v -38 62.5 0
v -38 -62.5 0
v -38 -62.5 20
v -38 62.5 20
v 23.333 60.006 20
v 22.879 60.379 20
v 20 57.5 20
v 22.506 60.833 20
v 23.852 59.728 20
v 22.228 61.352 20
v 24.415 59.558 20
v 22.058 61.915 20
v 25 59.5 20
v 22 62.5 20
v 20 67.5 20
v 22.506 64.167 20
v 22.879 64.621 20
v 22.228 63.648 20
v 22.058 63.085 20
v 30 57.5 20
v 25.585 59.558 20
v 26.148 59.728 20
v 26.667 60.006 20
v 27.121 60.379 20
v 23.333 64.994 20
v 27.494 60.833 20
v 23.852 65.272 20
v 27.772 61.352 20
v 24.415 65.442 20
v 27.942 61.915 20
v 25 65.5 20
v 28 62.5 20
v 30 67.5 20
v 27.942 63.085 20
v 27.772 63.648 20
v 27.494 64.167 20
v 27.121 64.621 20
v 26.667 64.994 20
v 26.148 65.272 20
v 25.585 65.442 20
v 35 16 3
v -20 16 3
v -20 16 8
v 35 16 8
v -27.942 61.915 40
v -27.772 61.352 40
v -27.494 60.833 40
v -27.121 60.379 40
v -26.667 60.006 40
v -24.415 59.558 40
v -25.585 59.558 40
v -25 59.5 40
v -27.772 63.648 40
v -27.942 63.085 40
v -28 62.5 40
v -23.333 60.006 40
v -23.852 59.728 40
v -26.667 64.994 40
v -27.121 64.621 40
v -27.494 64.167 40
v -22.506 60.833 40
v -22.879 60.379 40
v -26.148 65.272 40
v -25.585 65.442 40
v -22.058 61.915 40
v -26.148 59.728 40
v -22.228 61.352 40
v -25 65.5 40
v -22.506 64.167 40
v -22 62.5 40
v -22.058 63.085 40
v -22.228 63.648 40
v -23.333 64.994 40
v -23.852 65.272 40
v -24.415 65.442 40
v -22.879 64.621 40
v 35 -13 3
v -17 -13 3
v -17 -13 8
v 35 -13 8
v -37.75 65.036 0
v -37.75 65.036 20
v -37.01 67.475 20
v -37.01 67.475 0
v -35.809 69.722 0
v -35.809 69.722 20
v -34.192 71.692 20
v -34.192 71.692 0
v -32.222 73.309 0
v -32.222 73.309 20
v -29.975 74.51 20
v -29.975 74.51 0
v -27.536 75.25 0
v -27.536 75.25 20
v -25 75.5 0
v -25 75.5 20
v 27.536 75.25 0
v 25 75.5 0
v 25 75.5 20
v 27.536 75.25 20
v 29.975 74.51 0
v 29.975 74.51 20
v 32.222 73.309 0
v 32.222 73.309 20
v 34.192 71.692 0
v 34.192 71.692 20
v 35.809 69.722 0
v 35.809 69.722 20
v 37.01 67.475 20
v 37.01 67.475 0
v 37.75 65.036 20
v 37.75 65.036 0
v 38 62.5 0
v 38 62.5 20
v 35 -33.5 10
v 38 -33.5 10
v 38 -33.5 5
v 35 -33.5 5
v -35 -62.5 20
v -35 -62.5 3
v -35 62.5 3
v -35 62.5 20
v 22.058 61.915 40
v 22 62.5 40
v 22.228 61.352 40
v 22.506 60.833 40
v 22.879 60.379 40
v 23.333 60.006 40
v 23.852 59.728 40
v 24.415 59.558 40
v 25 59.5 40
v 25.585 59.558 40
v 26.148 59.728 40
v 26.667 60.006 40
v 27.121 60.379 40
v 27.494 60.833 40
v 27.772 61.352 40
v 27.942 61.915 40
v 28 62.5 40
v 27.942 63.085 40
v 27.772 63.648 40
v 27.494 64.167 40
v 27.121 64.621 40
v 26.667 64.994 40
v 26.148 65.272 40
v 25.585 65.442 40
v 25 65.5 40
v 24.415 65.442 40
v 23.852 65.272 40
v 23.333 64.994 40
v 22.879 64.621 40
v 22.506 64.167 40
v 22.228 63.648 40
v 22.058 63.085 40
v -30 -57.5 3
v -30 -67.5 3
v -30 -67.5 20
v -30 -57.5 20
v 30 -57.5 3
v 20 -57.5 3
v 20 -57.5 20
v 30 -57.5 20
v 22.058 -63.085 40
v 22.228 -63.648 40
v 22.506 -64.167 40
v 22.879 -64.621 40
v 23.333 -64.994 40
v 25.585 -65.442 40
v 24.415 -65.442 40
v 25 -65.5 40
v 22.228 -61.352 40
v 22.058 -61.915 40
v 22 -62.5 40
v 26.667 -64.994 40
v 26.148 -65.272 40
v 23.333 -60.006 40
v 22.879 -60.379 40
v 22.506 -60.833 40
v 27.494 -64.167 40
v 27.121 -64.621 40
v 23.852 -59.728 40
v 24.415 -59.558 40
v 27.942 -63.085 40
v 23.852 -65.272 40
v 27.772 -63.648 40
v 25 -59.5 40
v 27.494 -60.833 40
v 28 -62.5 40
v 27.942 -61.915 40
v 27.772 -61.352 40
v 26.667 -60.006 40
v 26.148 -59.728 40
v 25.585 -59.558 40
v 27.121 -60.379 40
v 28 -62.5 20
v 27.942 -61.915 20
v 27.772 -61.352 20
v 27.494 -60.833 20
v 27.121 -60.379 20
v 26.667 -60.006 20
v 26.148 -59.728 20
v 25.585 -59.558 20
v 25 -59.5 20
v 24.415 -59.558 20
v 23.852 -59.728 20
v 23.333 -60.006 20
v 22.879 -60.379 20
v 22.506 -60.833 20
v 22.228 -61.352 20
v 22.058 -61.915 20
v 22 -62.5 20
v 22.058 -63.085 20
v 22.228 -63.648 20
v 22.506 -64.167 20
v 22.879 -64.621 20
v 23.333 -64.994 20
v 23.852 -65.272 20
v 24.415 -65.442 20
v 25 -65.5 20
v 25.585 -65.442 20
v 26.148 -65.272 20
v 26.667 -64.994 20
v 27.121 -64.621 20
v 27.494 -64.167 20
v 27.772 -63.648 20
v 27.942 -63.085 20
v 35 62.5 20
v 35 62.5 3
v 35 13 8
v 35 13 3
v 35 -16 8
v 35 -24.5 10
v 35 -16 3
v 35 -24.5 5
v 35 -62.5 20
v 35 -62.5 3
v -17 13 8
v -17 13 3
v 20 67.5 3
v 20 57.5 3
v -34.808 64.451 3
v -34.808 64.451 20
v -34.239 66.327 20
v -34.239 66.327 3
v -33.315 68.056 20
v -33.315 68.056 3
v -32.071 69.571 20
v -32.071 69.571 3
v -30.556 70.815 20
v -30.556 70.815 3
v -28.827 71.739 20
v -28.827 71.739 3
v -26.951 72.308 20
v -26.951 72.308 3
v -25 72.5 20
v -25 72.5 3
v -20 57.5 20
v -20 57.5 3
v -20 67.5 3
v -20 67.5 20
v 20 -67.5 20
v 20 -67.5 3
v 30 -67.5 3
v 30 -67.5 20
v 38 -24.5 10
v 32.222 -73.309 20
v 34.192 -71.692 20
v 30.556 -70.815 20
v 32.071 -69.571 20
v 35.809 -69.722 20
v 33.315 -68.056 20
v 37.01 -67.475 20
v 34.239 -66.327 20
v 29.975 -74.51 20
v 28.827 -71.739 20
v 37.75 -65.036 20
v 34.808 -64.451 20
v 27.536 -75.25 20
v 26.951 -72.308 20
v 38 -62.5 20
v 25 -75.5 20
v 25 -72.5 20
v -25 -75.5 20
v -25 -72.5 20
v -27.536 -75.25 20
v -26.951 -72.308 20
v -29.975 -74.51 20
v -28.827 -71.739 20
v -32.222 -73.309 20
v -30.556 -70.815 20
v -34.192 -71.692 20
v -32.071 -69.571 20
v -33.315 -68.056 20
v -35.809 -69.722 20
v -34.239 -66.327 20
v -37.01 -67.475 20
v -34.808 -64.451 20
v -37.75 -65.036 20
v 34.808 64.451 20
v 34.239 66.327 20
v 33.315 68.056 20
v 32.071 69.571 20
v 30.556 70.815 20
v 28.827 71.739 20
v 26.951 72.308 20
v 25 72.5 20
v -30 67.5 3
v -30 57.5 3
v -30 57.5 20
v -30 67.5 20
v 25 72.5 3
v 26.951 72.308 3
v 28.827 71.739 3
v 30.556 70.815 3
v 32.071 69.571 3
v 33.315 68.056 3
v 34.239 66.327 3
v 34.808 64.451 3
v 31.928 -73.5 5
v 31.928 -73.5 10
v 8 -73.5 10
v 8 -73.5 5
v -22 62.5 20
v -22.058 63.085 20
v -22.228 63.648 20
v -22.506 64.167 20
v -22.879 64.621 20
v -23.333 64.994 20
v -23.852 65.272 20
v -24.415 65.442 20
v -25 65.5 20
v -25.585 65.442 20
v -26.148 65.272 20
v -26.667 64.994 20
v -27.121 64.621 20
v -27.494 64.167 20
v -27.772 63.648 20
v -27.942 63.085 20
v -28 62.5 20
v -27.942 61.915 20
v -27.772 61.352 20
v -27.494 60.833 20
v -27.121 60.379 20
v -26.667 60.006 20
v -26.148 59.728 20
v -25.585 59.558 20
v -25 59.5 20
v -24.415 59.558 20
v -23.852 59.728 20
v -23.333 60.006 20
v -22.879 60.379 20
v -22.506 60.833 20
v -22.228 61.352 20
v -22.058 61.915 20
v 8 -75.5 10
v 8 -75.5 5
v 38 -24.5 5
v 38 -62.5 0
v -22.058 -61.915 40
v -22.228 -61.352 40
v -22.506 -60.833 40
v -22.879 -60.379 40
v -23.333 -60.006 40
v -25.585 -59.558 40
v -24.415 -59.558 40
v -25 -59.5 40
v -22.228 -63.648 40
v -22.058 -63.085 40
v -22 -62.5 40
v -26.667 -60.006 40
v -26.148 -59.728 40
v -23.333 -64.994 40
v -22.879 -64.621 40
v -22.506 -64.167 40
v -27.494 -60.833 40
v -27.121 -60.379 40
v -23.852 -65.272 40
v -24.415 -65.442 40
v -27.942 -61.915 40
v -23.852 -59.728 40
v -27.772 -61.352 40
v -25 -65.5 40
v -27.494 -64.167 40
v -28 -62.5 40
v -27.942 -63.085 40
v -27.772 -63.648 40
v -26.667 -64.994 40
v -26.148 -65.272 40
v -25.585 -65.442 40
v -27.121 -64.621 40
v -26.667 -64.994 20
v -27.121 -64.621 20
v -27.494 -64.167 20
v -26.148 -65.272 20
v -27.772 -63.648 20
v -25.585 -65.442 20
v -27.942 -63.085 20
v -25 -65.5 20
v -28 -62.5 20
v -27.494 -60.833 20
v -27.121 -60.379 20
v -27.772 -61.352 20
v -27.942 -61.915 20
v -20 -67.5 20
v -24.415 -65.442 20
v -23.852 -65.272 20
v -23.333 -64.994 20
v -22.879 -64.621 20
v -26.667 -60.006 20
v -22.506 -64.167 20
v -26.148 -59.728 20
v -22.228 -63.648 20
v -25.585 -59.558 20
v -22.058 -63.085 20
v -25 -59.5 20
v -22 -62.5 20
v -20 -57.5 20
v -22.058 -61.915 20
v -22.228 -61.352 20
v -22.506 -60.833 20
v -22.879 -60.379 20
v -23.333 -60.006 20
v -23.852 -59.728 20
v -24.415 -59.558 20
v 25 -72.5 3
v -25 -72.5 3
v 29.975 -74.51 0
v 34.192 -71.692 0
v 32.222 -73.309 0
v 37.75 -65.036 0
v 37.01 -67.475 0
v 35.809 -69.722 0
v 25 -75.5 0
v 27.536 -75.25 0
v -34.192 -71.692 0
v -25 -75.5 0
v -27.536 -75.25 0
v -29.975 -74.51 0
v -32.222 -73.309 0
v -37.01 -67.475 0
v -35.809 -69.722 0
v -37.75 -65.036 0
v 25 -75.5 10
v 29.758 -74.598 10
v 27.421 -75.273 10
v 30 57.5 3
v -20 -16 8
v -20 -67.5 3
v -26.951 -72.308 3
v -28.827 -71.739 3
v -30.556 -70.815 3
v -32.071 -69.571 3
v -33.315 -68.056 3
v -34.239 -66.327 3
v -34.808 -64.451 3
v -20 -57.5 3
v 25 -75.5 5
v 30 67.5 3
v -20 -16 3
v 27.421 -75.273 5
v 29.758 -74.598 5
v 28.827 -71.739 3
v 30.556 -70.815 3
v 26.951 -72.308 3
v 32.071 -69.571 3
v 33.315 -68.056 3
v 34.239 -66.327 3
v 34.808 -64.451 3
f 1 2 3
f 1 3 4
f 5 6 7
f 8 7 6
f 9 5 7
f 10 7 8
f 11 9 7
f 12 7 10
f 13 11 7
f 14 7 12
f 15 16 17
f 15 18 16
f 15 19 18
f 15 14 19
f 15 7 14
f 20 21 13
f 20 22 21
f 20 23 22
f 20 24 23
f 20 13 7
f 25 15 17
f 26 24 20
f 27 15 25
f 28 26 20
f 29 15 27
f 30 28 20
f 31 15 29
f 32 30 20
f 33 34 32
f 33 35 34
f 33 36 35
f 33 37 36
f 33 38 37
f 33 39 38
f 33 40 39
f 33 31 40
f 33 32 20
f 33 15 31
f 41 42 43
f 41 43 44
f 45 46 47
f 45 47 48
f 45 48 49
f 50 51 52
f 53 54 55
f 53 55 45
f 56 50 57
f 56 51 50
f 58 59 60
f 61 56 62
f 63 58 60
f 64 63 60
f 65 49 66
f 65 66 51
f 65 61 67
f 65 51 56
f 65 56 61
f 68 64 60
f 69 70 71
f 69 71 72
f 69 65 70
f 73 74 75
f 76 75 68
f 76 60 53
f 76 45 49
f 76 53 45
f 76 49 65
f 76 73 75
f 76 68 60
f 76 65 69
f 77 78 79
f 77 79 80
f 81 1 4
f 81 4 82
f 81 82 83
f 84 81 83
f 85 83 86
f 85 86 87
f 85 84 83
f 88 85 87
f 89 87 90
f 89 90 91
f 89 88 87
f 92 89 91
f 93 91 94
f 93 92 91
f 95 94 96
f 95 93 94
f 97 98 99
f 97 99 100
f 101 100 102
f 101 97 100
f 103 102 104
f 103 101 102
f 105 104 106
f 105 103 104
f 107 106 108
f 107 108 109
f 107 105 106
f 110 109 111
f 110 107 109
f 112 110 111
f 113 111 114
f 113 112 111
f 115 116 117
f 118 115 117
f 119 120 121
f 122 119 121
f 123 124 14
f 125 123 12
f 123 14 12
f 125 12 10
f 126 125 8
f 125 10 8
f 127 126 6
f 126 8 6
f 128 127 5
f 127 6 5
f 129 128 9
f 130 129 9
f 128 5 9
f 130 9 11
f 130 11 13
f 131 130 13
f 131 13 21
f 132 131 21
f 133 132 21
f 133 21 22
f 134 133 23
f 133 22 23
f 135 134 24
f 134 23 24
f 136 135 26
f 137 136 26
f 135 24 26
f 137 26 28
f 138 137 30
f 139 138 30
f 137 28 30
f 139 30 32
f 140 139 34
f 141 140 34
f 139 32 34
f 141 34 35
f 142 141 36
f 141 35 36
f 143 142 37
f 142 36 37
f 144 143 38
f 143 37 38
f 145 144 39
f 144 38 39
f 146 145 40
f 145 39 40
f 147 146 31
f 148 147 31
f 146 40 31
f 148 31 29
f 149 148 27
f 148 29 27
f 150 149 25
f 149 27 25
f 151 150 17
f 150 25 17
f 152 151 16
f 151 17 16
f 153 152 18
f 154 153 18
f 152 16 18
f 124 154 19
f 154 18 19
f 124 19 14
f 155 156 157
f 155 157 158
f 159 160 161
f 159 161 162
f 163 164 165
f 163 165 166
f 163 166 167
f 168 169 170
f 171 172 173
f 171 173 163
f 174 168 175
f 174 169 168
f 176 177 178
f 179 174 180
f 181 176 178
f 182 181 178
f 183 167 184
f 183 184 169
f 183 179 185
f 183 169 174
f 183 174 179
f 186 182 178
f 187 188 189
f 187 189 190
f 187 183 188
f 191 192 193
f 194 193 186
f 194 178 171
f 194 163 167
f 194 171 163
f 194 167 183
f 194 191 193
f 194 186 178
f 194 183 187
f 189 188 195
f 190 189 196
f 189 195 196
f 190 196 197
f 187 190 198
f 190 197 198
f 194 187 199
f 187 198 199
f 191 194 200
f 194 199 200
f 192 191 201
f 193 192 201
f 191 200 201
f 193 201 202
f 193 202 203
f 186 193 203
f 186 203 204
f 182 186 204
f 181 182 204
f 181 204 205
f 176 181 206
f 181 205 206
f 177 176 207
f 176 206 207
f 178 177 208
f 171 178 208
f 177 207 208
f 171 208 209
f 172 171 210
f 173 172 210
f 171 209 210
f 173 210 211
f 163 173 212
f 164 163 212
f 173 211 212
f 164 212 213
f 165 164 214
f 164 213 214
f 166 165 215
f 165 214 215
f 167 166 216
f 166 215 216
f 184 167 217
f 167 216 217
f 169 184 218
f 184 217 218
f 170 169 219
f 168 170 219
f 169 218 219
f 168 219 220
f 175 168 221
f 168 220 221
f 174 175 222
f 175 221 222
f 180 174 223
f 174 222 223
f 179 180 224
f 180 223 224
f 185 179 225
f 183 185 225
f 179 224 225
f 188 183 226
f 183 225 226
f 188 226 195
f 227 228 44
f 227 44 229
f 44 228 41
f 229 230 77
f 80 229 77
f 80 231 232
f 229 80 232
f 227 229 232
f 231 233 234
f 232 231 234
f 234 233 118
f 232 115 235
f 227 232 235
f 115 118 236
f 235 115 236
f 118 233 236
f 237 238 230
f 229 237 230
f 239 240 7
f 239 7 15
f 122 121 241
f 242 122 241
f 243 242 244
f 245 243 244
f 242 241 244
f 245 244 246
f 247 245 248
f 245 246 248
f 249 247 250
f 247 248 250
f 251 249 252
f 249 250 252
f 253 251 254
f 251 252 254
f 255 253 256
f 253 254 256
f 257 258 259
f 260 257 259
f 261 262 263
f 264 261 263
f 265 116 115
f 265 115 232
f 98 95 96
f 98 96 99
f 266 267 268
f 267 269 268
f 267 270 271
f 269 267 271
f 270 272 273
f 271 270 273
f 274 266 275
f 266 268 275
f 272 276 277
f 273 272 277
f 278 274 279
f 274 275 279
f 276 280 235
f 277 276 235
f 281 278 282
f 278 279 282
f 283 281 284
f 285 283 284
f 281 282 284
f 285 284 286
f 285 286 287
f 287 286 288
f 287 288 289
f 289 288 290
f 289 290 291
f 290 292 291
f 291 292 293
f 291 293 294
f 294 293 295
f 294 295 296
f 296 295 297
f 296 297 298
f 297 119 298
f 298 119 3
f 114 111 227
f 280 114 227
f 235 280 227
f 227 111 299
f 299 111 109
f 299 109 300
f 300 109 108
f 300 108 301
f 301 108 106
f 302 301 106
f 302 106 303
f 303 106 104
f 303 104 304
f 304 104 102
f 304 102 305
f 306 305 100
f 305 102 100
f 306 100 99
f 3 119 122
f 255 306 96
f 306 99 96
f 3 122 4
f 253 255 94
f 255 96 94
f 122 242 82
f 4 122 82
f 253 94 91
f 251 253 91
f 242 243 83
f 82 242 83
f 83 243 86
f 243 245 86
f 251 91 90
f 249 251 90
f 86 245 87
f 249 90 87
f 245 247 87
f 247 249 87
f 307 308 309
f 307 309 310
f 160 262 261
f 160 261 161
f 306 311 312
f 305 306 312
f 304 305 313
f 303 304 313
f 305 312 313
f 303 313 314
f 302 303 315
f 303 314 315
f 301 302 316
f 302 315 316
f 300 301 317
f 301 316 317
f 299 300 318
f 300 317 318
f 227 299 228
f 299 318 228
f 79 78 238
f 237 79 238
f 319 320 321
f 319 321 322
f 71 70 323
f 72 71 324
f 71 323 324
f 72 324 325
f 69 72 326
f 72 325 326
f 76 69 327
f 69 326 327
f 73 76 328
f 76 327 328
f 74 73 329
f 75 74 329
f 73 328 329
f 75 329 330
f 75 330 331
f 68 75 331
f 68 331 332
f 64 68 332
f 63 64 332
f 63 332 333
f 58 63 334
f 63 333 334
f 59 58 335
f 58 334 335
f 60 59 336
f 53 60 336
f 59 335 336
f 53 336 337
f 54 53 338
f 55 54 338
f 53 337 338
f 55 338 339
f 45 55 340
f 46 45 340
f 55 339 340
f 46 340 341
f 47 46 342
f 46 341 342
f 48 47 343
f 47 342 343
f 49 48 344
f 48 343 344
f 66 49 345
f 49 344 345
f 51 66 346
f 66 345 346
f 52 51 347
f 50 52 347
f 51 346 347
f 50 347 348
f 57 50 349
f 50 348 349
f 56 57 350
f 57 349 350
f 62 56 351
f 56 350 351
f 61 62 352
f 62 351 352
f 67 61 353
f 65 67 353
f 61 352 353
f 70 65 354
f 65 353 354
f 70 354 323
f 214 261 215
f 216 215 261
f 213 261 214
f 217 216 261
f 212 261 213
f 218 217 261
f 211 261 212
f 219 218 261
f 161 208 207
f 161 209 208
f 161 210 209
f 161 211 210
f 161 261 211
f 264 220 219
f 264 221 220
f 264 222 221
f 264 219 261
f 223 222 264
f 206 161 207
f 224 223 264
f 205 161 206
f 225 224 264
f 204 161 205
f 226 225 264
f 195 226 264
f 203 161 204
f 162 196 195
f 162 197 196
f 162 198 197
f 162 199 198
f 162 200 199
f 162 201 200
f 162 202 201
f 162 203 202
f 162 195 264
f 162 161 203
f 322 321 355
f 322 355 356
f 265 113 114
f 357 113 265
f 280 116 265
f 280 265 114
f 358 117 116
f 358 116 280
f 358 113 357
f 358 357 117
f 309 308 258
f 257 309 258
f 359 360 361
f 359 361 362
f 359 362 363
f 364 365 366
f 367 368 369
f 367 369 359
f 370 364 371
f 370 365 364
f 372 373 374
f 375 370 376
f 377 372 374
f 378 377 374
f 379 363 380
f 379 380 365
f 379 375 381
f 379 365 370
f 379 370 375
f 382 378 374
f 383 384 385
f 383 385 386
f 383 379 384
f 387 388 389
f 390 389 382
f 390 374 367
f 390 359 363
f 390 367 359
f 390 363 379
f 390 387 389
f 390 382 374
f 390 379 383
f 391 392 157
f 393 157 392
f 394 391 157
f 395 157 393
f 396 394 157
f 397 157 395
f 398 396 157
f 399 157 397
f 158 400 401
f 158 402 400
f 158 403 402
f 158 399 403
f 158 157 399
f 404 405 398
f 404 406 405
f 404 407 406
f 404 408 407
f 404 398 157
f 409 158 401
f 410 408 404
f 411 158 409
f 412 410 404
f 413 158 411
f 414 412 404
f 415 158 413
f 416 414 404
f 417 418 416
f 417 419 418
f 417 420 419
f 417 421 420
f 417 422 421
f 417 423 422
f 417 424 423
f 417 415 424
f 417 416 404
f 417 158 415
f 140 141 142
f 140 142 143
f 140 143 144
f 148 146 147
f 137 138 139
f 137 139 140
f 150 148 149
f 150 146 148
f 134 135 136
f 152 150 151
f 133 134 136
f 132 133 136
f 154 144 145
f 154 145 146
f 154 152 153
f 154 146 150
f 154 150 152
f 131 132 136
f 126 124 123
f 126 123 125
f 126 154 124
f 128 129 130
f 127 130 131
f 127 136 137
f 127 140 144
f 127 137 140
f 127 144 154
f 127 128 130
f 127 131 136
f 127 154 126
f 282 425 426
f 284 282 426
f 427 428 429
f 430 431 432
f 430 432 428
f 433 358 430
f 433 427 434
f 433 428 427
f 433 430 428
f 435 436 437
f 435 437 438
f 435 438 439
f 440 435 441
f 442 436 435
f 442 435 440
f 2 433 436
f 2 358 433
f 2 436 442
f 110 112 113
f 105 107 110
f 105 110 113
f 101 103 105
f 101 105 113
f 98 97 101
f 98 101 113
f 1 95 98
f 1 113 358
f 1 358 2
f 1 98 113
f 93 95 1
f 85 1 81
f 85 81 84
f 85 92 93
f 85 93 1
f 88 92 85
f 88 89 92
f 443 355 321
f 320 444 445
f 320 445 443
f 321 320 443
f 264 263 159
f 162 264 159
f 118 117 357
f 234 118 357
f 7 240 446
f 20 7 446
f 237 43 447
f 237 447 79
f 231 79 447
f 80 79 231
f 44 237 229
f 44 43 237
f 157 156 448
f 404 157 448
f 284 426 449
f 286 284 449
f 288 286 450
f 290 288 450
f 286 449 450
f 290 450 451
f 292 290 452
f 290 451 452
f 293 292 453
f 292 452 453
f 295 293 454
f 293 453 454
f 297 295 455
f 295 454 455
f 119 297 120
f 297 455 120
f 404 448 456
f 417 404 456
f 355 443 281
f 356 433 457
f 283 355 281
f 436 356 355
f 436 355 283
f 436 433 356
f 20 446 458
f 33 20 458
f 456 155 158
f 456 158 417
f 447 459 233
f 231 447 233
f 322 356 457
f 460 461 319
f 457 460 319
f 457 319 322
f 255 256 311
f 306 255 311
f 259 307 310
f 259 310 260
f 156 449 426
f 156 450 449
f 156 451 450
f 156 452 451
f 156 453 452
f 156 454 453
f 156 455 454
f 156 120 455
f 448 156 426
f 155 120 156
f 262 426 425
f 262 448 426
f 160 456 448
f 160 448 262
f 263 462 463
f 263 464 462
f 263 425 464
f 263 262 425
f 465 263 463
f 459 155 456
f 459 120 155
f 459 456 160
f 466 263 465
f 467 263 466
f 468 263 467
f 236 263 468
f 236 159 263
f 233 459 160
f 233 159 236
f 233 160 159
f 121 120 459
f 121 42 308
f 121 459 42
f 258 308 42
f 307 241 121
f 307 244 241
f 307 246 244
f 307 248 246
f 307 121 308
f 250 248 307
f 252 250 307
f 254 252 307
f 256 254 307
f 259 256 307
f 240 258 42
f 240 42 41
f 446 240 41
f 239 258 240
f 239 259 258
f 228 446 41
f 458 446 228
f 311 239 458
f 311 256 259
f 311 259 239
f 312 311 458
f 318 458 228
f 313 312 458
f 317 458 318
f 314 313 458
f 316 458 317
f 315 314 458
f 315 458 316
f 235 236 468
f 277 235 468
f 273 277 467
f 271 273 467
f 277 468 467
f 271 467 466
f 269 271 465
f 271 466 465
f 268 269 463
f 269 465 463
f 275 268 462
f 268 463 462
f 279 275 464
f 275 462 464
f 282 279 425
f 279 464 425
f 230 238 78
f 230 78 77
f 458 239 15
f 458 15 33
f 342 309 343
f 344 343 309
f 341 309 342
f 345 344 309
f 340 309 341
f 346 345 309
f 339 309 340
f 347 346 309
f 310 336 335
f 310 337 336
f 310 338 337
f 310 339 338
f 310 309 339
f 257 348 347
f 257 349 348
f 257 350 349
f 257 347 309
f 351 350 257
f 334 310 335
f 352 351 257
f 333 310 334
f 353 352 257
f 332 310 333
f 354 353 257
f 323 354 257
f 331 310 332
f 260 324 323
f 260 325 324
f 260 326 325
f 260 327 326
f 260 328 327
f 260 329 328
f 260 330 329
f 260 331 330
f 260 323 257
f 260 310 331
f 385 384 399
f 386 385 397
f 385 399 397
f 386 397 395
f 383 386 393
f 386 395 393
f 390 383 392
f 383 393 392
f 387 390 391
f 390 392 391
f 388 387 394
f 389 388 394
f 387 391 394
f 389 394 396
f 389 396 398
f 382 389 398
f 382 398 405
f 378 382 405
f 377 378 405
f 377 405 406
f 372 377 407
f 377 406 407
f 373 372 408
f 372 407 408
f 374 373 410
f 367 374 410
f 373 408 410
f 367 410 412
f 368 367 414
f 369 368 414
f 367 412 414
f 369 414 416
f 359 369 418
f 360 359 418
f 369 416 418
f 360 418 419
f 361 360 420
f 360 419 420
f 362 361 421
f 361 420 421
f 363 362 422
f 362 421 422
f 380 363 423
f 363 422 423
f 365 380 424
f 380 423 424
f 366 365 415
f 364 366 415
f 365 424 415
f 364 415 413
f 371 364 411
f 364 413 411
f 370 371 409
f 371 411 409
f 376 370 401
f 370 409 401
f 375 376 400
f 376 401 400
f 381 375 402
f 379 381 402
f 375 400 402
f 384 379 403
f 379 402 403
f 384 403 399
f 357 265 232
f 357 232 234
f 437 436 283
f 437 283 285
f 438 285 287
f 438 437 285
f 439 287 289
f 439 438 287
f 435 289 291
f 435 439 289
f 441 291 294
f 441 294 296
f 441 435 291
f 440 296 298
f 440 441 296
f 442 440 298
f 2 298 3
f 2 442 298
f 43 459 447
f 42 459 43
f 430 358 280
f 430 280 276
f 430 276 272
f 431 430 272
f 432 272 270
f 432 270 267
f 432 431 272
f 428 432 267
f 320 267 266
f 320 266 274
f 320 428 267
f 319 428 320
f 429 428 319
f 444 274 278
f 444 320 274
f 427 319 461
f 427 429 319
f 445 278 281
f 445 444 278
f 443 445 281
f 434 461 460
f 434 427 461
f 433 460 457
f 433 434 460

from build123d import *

# Parameters (mm, degrees)
BOSS_EXTRUDE1_DEPTH = 20
BOSS_EXTRUDE2_DEPTH = 3
SKETCH4_W           = 10
SKETCH4_H           = 10
BOSS_EXTRUDE3_DEPTH = 17
SKETCH5_R           = 3
BOSS_EXTRUDE4_DEPTH = 20
SKETCH6_W           = 5
SKETCH6_H           = 9
CUT_EXTRUDE1_DEPTH  = 30
SKETCH7_W           = 58
SKETCH7_H           = 32
SKETCH7_W_2         = 52
SKETCH7_H_2         = 26
BOSS_EXTRUDE5_DEPTH = 5


with BuildPart() as part:
    # Sketch1 → Boss-Extrude1 (new body)
    with BuildSketch(Plane.XY):
        with BuildLine():
            Line((-25, 75.5), (25, 75.5))
            ThreePointArc((25, 75.5), (34.192388155, 71.692388155), (38, 62.5))
            Line((38, 62.5), (38, -62.5))
            ThreePointArc((38, -62.5), (34.192388155, -71.692388155), (25, -75.5))
            Line((25, -75.5), (-25, -75.5))
            ThreePointArc((-25, -75.5), (-34.192388155, -71.692388155), (-38, -62.5))
            Line((-38, -62.5), (-38, 62.5))
            ThreePointArc((-38, 62.5), (-34.192388155, 71.692388155), (-25, 75.5))
        make_face()
        with BuildLine():
            Line((-25, 72.5), (25, 72.5))
            ThreePointArc((25, 72.5), (32.071067812, 69.571067812), (35, 62.5))
            Line((35, 62.5), (35, -62.5))
            ThreePointArc((35, -62.5), (32.071067812, -69.571067812), (25, -72.5))
            Line((25, -72.5), (-25, -72.5))
            ThreePointArc((-25, -72.5), (-32.071067812, -69.571067812), (-35, -62.5))
            Line((-35, -62.5), (-35, 62.5))
            ThreePointArc((-35, 62.5), (-32.071067812, 69.571067812), (-25, 72.5))
        make_face(mode=Mode.SUBTRACT)
    extrude(amount=BOSS_EXTRUDE1_DEPTH)

    # Sketch3 → Boss-Extrude2 (add)
    with BuildSketch(Plane(origin=(0, 0, 0), x_dir=(-1, 0, 0), z_dir=(0, 0, -1))):
        with BuildLine():
            Line((25, -75.5), (-25, -75.5))
            ThreePointArc((-25, -75.5), (-34.192388155, -71.692388155), (-38, -62.5))
            Line((-38, -62.5), (-38, 62.5))
            ThreePointArc((-38, 62.5), (-34.192388155, 71.692388155), (-25, 75.5))
            Line((-25, 75.5), (25, 75.5))
            ThreePointArc((25, 75.5), (34.192388155, 71.692388155), (38, 62.5))
            Line((38, 62.5), (38, -62.5))
            ThreePointArc((38, -62.5), (34.192388155, -71.692388155), (25, -75.5))
        make_face()
    extrude(amount=-BOSS_EXTRUDE2_DEPTH)

    # Sketch4 → Boss-Extrude3 (add)
    with BuildSketch(Plane.XY.offset(3)):
        with Locations((-25, 62.5)):
            Rectangle(SKETCH4_W, SKETCH4_H)
        with Locations((25, 62.5)):
            Rectangle(SKETCH4_W, SKETCH4_H)
        with Locations((25, -62.5)):
            Rectangle(SKETCH4_W, SKETCH4_H)
        with Locations((-25, -62.5)):
            Rectangle(SKETCH4_W, SKETCH4_H)
    extrude(amount=BOSS_EXTRUDE3_DEPTH)

    # Sketch5 → Boss-Extrude4 (add)
    with BuildSketch(Plane.XY.offset(20)):
        with Locations((-25, 62.5)):
            Circle(SKETCH5_R)
        with Locations(Location((25, 62.5, 0), (0, 0, 180))):
            Circle(SKETCH5_R)
        with Locations((25, -62.5)):
            Circle(SKETCH5_R)
        with Locations(Location((-25, -62.5, 0), (0, 0, 180))):
            Circle(SKETCH5_R)
    extrude(amount=BOSS_EXTRUDE4_DEPTH)

    # Sketch6 → Cut-Extrude1 (cut)
    with BuildSketch(Plane(origin=(38, 0, 0), x_dir=(0, 0, -1), z_dir=(1, 0, 0))):
        with Locations((-7.5, -29)):
            Rectangle(SKETCH6_W, SKETCH6_H)
        with Locations((-7.5, -78)):
            Rectangle(SKETCH6_W, SKETCH6_H)
    extrude(amount=-CUT_EXTRUDE1_DEPTH, mode=Mode.SUBTRACT)

    # Sketch7 → Boss-Extrude5 (add)
    with BuildSketch(Plane.XY.offset(3)):
        with Locations((9, 0)):
            Rectangle(SKETCH7_W, SKETCH7_H)
        with Locations((9, 0)):
            Rectangle(SKETCH7_W_2, SKETCH7_H_2, mode=Mode.SUBTRACT)
    extrude(amount=BOSS_EXTRUDE5_DEPTH)


solid = part.part
